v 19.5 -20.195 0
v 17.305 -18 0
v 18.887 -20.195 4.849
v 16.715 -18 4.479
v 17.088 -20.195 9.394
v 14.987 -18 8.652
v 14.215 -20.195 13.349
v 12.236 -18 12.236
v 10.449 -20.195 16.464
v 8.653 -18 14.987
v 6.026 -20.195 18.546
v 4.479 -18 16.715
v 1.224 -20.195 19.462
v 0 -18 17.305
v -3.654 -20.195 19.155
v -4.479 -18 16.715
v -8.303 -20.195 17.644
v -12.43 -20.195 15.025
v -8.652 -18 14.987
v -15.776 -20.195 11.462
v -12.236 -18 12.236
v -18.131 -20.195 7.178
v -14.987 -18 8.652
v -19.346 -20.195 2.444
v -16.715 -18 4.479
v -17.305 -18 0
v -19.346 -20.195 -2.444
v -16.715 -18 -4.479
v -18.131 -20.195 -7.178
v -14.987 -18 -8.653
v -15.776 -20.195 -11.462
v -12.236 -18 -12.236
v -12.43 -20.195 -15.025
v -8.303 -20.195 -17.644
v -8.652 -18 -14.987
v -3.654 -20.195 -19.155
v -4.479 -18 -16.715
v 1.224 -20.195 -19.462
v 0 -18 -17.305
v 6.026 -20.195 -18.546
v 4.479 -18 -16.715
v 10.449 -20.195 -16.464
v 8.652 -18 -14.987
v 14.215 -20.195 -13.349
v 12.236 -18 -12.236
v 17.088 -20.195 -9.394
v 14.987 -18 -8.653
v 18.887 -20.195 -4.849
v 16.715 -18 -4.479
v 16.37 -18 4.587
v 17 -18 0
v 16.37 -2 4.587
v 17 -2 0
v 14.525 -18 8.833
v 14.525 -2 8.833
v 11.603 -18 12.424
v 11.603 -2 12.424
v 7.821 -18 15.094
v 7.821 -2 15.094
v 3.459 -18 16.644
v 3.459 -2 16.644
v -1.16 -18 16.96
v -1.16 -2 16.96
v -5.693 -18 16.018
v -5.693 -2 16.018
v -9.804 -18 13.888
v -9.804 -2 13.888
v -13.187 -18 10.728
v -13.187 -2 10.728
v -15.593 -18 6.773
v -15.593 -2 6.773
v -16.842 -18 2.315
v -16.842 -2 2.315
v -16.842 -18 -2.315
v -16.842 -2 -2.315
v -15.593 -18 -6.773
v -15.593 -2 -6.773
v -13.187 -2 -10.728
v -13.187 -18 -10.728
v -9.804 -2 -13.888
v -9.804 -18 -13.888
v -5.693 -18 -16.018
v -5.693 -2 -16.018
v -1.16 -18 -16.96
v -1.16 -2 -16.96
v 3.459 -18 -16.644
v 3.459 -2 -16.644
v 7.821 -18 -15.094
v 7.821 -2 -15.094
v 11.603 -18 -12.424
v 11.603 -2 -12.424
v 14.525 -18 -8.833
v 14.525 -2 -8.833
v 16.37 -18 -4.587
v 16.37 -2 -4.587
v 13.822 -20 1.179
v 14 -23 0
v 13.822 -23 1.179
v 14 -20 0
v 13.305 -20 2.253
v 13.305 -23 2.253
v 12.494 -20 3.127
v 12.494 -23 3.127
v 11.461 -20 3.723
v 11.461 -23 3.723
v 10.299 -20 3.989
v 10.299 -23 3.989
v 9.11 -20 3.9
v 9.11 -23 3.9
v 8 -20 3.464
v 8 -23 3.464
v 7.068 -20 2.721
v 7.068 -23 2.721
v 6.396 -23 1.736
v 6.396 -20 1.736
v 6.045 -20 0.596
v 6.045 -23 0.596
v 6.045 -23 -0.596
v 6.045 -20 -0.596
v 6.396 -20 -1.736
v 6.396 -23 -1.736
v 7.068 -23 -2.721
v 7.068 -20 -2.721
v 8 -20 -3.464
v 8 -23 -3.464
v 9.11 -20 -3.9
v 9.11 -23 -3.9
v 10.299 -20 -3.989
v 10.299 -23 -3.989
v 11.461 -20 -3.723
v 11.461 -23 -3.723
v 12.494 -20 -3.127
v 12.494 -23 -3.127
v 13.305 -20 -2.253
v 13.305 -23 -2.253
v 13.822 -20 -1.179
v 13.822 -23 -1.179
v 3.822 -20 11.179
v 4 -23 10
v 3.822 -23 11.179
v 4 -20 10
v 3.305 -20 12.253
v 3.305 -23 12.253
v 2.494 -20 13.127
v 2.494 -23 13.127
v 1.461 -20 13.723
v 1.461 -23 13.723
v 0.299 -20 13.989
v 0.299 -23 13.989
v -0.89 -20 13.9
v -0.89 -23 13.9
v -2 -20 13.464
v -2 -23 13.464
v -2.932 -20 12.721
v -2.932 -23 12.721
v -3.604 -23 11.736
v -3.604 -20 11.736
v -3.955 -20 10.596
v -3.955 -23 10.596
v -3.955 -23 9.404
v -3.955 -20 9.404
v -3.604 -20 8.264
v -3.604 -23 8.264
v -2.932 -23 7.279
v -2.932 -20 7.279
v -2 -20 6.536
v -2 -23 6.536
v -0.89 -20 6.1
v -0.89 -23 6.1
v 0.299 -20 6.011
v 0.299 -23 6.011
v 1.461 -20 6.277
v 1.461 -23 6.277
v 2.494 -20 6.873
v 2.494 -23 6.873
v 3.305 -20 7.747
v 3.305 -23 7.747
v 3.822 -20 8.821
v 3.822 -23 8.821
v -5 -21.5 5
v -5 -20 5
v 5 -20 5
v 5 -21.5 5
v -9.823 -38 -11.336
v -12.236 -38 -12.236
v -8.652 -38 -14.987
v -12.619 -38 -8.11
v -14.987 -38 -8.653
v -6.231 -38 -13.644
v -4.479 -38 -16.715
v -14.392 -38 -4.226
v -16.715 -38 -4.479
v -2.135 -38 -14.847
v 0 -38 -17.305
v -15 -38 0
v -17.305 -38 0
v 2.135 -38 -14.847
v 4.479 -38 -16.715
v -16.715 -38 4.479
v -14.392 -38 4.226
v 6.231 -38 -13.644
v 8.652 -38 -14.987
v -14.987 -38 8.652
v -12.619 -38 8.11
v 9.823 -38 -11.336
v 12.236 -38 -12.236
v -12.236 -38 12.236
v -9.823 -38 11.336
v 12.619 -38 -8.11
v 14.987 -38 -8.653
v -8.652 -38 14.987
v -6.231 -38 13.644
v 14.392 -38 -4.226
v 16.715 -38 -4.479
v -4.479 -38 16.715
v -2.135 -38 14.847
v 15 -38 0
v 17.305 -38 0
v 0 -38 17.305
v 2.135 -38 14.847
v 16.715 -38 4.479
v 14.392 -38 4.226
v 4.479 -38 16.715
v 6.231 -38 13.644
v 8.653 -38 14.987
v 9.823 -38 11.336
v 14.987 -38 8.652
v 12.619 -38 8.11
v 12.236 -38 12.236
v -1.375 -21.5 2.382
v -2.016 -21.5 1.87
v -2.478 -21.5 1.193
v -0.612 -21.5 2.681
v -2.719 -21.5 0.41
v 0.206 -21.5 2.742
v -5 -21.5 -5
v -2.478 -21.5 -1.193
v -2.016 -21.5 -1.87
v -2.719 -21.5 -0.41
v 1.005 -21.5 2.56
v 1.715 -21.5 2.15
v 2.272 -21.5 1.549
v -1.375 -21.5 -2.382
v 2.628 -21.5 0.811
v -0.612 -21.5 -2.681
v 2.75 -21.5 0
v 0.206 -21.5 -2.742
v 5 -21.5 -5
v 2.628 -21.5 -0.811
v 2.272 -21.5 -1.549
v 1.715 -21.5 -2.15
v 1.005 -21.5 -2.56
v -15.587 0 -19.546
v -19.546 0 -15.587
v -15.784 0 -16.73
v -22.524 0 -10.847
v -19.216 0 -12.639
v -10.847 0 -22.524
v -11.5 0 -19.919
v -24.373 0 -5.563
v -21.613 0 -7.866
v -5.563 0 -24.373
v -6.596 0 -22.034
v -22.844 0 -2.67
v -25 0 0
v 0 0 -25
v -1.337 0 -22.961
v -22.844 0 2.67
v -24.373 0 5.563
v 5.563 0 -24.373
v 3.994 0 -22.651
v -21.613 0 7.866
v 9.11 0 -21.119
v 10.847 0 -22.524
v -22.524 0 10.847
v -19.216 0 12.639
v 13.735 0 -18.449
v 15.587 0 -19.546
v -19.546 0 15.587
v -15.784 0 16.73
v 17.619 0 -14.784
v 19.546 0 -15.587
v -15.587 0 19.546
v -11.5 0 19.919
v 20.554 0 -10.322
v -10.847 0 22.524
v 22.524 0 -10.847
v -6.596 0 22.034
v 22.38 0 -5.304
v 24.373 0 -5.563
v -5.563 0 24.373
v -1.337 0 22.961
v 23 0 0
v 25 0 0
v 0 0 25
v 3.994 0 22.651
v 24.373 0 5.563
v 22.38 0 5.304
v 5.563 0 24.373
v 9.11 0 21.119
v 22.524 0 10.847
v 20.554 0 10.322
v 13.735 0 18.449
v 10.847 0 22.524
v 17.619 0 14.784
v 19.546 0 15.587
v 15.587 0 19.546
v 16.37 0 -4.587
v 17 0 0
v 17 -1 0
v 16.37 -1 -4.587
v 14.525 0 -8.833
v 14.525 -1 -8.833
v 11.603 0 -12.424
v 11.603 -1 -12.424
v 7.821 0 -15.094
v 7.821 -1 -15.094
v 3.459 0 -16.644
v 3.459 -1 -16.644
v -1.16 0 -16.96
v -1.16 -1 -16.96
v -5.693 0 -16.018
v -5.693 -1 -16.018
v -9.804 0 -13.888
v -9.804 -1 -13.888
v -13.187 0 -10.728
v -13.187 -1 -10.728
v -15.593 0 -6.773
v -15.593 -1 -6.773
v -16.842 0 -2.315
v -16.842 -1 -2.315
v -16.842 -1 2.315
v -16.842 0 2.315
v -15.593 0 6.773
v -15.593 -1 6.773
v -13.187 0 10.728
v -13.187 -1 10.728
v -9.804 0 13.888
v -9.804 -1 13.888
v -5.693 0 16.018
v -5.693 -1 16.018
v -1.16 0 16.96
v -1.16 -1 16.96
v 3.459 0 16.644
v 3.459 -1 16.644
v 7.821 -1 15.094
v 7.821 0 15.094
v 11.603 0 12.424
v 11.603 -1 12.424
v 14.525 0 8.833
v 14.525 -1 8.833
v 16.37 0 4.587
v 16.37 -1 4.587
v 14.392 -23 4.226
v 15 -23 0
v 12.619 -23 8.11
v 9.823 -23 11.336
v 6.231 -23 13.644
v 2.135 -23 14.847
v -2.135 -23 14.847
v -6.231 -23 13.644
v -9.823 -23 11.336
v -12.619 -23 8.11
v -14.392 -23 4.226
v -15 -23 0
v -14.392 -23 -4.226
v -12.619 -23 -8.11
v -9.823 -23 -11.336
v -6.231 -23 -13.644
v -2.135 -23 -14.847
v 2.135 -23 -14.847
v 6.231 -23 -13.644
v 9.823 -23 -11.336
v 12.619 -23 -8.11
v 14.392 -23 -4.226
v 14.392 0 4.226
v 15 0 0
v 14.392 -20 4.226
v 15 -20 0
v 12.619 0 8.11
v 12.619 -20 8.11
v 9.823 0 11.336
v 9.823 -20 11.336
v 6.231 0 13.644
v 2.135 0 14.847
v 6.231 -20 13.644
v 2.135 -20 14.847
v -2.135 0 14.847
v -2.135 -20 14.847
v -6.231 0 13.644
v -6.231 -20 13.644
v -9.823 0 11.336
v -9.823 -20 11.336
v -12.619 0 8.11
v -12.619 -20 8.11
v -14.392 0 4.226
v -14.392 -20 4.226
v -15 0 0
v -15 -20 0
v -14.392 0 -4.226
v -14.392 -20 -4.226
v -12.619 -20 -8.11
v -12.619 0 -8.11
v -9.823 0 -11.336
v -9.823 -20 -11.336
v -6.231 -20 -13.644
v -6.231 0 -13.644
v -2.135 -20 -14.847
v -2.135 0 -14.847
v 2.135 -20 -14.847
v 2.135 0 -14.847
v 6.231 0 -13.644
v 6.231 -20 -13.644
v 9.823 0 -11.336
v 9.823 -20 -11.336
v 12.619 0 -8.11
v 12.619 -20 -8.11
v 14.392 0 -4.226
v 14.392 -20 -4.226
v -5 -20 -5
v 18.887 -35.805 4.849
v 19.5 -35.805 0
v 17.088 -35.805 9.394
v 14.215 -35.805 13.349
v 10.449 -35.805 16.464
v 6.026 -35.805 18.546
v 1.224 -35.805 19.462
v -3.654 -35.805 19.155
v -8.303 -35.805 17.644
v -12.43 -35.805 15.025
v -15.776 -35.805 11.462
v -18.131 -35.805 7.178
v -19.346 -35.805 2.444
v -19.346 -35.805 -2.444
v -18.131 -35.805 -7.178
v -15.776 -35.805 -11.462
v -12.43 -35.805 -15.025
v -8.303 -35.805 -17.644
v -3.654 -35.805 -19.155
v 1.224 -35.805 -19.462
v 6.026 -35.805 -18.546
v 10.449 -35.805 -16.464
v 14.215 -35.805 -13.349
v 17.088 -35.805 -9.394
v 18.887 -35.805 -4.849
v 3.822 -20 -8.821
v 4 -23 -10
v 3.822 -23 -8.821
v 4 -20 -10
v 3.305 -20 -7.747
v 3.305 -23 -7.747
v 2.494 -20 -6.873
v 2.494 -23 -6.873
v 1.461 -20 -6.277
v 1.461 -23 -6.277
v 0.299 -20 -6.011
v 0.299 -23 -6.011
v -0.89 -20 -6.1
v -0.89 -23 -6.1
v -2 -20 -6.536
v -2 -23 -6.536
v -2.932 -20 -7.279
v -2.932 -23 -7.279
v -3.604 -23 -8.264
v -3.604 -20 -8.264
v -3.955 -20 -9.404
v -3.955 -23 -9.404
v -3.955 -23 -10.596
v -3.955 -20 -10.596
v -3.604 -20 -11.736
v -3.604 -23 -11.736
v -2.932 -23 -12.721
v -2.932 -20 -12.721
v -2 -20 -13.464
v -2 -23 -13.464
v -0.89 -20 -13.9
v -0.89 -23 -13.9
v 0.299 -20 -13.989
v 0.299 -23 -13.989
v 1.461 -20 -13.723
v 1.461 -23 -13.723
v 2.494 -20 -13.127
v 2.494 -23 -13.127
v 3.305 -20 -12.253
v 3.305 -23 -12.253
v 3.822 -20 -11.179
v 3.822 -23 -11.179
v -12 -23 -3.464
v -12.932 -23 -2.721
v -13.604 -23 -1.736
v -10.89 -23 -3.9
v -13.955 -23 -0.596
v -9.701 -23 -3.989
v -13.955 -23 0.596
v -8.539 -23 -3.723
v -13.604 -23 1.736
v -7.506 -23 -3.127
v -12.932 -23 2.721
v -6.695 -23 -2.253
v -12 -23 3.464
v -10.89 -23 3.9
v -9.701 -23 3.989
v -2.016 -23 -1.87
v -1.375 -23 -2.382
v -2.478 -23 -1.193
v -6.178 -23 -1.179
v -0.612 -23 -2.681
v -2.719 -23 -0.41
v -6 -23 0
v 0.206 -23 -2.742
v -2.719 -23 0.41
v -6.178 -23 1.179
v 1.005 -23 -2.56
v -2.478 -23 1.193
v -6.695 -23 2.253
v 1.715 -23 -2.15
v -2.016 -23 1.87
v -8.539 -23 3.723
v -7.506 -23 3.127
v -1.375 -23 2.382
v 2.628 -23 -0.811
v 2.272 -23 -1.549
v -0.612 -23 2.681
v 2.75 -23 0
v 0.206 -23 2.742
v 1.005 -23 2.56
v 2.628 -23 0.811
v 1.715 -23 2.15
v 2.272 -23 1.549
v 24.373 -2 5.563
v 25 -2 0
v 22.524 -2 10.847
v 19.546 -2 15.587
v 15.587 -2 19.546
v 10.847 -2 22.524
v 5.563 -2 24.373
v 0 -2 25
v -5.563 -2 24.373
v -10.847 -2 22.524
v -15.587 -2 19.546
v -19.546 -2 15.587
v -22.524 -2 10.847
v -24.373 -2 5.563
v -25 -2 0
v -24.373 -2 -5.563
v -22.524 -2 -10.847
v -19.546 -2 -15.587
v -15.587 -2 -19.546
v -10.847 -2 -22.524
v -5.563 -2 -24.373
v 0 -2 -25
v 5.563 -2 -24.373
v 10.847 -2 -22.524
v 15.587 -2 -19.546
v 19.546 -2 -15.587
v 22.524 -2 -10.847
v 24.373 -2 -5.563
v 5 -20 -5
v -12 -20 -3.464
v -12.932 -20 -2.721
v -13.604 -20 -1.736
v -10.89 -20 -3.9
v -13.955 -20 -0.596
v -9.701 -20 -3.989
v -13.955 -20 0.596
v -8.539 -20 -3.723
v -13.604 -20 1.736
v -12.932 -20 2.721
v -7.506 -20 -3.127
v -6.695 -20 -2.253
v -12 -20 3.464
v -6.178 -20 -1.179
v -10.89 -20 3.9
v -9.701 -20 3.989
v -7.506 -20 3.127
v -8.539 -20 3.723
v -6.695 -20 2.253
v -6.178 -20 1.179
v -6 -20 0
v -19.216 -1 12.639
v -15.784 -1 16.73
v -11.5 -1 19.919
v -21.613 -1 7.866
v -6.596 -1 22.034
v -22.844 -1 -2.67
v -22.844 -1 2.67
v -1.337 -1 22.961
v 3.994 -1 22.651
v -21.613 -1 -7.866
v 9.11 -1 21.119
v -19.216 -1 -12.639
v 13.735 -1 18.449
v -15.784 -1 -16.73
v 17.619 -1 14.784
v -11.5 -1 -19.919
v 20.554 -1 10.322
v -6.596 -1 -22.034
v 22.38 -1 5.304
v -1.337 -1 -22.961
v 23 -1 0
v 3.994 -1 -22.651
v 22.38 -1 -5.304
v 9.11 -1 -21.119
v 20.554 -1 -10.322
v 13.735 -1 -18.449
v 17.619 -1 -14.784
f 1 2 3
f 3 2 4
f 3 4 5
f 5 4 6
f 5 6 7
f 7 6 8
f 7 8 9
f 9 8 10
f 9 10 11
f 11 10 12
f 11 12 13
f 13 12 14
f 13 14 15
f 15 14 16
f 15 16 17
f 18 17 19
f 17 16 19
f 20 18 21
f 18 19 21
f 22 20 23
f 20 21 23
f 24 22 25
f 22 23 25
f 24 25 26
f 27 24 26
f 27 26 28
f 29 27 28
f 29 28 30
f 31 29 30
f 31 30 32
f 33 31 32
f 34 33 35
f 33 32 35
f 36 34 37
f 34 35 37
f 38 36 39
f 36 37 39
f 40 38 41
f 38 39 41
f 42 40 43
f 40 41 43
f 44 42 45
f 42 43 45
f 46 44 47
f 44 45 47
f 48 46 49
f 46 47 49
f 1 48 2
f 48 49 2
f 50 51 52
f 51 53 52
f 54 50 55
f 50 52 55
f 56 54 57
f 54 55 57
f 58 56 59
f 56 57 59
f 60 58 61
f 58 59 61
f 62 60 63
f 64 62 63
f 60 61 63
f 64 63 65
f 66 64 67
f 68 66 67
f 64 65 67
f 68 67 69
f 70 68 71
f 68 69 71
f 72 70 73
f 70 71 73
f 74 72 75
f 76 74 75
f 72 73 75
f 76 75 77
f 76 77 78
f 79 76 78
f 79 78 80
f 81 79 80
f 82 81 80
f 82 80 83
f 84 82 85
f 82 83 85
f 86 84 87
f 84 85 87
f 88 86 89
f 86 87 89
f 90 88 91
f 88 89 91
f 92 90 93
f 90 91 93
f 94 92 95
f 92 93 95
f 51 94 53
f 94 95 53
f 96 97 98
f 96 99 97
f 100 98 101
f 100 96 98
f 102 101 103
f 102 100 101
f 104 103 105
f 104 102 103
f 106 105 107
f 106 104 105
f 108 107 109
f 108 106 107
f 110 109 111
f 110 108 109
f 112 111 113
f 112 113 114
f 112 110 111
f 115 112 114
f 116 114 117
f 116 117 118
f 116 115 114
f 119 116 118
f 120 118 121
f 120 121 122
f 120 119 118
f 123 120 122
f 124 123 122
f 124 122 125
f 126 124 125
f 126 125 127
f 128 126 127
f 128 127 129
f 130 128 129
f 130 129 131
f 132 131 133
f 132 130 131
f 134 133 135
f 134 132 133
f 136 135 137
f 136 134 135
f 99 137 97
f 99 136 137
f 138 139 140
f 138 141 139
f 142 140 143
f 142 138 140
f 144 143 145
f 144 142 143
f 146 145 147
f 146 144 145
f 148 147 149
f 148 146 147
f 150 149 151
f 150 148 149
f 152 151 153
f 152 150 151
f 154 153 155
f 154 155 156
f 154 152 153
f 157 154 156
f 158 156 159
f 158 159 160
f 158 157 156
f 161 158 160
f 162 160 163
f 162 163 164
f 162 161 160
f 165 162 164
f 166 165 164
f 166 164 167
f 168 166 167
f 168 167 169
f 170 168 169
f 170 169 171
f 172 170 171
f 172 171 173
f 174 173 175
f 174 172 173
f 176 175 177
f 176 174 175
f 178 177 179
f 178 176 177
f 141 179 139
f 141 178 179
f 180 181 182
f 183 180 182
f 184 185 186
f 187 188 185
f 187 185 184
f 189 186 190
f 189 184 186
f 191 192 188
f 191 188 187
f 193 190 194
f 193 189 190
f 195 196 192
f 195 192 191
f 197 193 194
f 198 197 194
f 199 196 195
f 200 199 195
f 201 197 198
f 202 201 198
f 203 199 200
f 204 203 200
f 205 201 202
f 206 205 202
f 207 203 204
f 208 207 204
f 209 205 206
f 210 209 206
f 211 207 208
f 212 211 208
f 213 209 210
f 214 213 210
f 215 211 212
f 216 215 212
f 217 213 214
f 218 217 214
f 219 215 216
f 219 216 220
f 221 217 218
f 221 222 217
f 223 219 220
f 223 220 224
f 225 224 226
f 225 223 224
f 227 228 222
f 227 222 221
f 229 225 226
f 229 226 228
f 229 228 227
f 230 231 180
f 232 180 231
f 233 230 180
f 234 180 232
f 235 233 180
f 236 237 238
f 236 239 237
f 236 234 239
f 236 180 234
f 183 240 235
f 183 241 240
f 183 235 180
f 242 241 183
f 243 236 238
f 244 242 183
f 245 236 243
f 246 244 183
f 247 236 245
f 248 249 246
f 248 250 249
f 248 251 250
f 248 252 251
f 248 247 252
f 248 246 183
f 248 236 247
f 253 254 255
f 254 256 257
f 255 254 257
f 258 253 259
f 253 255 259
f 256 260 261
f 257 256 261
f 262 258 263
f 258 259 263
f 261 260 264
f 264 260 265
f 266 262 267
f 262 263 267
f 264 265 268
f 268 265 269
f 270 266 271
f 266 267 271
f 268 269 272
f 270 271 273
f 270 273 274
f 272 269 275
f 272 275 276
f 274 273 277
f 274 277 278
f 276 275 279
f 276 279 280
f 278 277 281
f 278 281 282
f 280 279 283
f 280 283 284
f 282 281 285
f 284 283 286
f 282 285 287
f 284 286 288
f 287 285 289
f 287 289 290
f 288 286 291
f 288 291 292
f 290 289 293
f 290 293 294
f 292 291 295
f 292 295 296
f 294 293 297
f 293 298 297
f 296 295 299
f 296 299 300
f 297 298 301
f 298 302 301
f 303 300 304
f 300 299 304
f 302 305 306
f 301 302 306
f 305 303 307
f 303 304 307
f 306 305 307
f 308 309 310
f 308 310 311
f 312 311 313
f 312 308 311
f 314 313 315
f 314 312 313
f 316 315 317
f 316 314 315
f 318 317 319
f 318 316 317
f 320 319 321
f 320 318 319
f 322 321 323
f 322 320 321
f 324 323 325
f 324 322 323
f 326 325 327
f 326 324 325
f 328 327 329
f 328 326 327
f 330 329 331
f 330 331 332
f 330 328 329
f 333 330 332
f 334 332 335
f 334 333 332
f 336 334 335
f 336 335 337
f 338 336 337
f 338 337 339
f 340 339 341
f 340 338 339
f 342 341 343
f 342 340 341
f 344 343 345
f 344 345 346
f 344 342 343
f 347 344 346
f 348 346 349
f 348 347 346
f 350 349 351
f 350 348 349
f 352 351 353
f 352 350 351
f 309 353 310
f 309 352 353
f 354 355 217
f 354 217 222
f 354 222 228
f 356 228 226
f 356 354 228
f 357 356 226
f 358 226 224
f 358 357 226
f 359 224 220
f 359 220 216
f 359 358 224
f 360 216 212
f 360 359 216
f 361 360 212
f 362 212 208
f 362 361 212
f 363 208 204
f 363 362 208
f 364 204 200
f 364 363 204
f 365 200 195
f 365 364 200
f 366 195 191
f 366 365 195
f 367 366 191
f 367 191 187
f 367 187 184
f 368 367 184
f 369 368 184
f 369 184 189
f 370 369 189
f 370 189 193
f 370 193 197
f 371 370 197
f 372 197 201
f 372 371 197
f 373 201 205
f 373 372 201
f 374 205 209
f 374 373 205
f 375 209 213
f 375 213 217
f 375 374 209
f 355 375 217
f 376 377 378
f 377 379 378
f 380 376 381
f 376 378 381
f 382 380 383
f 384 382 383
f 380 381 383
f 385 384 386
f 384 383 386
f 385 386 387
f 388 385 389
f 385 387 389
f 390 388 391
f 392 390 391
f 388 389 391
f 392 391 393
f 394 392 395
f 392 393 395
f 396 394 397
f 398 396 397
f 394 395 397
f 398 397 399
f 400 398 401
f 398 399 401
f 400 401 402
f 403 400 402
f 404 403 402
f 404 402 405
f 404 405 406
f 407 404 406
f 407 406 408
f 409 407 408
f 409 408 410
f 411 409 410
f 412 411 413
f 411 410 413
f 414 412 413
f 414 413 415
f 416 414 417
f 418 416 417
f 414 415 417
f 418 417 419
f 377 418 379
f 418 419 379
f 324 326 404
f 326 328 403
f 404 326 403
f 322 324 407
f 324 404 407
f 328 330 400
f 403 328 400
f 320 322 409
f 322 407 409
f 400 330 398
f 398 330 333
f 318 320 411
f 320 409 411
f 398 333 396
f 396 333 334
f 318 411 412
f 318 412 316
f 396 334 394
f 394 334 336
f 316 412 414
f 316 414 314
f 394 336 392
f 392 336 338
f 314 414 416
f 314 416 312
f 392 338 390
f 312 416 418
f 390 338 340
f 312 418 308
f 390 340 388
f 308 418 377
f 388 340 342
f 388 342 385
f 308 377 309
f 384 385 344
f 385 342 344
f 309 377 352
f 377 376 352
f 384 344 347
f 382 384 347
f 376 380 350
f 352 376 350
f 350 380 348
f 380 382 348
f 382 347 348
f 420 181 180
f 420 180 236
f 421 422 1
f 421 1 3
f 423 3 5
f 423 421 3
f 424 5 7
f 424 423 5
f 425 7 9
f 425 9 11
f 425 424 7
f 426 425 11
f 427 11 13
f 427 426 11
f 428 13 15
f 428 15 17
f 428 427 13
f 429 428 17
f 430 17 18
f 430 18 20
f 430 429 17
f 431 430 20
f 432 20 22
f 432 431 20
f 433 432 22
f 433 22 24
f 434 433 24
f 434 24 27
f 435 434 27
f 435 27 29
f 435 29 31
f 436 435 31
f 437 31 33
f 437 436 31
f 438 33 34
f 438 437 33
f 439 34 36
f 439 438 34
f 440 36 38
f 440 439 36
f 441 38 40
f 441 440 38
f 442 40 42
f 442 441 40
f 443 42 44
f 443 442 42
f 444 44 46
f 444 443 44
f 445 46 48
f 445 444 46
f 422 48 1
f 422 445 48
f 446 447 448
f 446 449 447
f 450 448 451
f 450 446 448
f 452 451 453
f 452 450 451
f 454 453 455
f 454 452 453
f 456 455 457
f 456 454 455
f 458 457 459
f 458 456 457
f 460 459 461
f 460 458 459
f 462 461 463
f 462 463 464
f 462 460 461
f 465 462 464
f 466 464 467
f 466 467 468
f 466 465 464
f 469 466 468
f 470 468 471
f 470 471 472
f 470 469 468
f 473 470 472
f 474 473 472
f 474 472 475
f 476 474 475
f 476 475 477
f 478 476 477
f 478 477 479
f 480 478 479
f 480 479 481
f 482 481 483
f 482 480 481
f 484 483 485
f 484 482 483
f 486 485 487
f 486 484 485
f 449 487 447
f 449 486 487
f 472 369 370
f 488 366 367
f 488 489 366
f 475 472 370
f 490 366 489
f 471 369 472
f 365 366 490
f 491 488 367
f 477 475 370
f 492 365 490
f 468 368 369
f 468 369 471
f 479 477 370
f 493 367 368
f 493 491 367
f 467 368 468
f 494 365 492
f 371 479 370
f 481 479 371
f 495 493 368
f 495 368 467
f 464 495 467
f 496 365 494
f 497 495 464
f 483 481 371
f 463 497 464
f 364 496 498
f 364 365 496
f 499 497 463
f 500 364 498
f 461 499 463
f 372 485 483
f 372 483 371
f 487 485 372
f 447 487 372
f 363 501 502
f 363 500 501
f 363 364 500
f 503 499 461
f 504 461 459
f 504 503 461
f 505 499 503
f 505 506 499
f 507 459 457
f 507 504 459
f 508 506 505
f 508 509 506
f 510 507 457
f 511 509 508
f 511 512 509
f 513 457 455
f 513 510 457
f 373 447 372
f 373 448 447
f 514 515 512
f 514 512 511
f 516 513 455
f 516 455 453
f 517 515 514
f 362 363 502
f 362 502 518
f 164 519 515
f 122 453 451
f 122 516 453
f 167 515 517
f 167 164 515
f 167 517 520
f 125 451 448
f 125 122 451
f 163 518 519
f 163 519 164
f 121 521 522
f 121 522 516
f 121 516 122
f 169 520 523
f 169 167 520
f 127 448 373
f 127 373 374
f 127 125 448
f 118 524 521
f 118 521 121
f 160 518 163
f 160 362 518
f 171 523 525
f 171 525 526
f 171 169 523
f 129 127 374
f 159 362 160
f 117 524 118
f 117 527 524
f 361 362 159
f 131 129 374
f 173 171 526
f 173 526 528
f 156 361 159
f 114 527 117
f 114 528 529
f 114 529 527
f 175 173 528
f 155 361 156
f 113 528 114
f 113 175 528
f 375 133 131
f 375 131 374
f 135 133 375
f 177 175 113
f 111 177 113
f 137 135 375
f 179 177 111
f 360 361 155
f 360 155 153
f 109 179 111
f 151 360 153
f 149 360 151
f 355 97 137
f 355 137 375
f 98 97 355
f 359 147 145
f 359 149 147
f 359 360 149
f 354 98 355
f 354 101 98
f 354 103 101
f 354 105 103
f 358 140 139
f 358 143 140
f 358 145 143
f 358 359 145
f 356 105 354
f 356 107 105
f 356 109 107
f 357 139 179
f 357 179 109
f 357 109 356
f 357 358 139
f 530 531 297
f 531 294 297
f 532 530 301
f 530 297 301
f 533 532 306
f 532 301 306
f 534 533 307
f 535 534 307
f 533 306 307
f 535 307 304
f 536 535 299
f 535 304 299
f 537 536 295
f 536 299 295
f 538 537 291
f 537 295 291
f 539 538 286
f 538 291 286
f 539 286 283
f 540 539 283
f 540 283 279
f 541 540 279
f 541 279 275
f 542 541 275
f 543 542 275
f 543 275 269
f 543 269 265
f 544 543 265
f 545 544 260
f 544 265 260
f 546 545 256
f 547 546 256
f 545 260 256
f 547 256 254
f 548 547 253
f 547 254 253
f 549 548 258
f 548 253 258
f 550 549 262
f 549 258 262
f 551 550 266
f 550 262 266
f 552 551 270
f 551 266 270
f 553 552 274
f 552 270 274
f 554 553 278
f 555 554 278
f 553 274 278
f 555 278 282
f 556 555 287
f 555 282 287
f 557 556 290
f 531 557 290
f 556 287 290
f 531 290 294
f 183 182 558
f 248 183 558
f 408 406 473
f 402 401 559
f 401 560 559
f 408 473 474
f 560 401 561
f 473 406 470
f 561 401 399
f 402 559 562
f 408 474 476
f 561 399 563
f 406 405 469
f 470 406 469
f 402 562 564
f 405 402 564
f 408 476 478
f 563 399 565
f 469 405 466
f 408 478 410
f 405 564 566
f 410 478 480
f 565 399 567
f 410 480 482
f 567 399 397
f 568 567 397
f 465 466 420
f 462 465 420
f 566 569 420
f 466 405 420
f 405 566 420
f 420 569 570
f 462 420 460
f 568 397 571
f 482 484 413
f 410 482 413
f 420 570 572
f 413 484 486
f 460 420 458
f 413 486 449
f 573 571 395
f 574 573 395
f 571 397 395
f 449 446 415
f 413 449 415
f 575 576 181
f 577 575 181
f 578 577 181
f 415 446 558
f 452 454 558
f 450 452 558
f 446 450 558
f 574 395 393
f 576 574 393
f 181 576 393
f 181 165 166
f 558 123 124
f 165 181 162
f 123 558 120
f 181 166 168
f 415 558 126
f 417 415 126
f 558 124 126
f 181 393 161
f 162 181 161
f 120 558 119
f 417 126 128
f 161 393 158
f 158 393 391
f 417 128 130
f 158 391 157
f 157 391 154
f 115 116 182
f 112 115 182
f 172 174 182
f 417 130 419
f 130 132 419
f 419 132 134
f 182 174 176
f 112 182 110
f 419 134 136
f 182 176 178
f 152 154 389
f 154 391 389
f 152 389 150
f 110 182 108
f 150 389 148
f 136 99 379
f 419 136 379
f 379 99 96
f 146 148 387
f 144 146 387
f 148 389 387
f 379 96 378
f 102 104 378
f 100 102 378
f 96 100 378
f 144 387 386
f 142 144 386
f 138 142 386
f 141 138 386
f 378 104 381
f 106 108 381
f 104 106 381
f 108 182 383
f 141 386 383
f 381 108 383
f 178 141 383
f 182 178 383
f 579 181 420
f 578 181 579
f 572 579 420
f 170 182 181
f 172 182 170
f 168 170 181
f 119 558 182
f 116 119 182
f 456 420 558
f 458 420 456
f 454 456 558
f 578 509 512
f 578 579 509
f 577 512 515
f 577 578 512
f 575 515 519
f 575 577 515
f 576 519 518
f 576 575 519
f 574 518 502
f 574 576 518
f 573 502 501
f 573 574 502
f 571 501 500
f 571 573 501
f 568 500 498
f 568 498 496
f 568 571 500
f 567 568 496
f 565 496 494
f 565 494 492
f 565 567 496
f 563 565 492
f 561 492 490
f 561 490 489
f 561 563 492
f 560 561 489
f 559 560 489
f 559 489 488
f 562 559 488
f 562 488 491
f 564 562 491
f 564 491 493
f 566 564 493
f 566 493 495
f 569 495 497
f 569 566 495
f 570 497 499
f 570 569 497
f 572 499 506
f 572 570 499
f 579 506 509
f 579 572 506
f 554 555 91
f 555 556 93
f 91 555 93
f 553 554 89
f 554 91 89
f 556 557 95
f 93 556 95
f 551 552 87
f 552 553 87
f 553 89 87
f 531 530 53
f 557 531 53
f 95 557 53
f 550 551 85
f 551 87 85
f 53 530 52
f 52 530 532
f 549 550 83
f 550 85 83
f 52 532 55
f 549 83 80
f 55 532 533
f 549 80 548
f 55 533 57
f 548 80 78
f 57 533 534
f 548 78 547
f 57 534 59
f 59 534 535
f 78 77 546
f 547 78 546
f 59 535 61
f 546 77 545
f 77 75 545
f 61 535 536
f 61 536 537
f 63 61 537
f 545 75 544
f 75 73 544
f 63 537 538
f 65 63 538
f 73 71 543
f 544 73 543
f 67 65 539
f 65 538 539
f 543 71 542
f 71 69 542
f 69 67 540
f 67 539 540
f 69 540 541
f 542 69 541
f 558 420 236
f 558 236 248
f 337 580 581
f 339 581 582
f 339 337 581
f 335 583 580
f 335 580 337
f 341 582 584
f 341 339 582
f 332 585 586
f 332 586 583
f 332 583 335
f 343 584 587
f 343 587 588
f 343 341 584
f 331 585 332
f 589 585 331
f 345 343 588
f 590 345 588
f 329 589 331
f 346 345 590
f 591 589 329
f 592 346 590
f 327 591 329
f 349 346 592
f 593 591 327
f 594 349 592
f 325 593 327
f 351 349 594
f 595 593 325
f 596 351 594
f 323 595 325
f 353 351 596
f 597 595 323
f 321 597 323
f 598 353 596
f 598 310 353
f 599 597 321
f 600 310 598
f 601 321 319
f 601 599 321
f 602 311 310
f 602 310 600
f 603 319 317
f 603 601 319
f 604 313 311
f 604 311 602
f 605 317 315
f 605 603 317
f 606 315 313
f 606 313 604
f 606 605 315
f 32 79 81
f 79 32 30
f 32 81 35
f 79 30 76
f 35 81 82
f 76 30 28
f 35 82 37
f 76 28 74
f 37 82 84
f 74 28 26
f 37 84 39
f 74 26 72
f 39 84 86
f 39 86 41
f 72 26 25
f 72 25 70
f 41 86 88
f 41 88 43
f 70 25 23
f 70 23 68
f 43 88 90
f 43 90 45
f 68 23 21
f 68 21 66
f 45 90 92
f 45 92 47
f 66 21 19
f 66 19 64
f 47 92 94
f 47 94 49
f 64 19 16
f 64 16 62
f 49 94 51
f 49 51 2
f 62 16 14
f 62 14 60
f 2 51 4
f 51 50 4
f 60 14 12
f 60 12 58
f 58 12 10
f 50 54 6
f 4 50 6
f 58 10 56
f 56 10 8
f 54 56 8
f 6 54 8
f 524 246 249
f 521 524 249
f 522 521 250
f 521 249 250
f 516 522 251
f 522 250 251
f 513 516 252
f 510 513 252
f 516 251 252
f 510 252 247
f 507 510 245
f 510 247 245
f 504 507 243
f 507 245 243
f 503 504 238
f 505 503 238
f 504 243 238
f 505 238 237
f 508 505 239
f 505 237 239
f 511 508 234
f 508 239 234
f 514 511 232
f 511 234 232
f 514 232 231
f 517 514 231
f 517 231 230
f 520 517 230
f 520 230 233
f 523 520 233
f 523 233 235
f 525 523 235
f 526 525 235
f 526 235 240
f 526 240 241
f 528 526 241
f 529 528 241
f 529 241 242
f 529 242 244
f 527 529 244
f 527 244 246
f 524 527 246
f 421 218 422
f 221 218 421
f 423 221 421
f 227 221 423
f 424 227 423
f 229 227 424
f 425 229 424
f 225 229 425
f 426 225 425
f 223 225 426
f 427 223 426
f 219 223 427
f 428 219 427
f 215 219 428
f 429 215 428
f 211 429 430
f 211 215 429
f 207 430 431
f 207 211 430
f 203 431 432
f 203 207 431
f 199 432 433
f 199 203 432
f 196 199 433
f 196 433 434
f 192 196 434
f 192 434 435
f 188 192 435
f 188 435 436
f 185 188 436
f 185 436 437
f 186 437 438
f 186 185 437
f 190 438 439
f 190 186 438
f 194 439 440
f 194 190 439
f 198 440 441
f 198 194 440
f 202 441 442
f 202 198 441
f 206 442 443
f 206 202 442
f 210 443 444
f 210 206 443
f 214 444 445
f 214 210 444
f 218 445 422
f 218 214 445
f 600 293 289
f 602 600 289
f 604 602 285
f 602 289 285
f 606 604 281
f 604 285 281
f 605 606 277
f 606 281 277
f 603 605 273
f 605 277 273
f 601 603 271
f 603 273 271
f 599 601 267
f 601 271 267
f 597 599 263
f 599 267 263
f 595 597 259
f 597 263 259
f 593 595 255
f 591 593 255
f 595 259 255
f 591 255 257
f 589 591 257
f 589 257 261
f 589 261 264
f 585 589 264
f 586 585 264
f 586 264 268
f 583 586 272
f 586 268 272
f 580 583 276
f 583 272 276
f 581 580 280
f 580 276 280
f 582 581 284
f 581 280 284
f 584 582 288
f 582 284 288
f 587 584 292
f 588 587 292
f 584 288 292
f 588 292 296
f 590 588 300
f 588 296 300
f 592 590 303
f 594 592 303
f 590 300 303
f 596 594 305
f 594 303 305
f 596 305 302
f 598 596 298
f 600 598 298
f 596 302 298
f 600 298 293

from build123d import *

# Parameters (mm, degrees)
SKETCH_3_R          = 23
SKETCH_3_R_2        = 17
CUT_EXTRUDE_1_DEPTH = 1
SKETCH_4_W          = 10
SKETCH_4_H          = 10
CUT_EXTRUDE_2_DEPTH = 1.5
SKETCH_5_R          = 4
CUT_EXTRUDE_3_DEPTH = 3
SKETCH_9_R          = 17
SKETCH_9_R_2        = 4
EXTRUDE_1_DEPTH     = 1
SKETCH_10_R         = 17
SKETCH_10_R_2       = 15
EXTRUDE_2_DEPTH     = 15
SKETCH_11_R         = 2.75
CUT_EXTRUDE_4_DEPTH = 17.5
SKETCH_12_R         = 19.5
SKETCH_12_R_2       = 17
EXTRUDE_3_DEPTH     = 20
CHAMFER_1_SIZE      = 2.195


with BuildPart() as part:
    # Эскиз2 → Повернуть1 (revolve)
    with BuildSketch(Plane.XY):
        Polygon((15, 0), (15, -20), (0, -20), (0, -22), (17, -22), (17, -2), (25, -2), (25, 0), align=None)
    revolve(axis=Axis((0, 0, 0), (0, -1, 0)))

    # Эскиз3 → Вырез-Вытянуть1 (cut)
    with BuildSketch(Plane(origin=(0, 0, 0), x_dir=(1, 0, 0), z_dir=(0, 1, 0))):
        Circle(SKETCH_3_R)
        Circle(SKETCH_3_R_2, mode=Mode.SUBTRACT)
    extrude(amount=-CUT_EXTRUDE_1_DEPTH, mode=Mode.SUBTRACT)

    # Эскиз4 → Вырез-Вытянуть2 (cut)
    with BuildSketch(Plane(origin=(0, -20, 0), x_dir=(1, 0, 0), z_dir=(0, 1, 0))):
        Rectangle(SKETCH_4_W, SKETCH_4_H)
    extrude(amount=-CUT_EXTRUDE_2_DEPTH, mode=Mode.SUBTRACT)

    # Эскиз5 → Вырез-Вытянуть3 (cut, through all)
    with BuildSketch(Plane(origin=(0, -20, 0), x_dir=(1, 0, 0), z_dir=(0, 1, 0))):
        with Locations((0, 10)):
            Circle(SKETCH_5_R)
        with Locations((10, 0)):
            Circle(SKETCH_5_R)
        with Locations((0, -10)):
            Circle(SKETCH_5_R)
        with Locations((-10, 0)):
            Circle(SKETCH_5_R)
    extrude(amount=-CUT_EXTRUDE_3_DEPTH, mode=Mode.SUBTRACT)

    # Эскиз9 → Бобышка-Вытянуть1 (add)
    with BuildSketch(Plane.XZ.offset(22)):
        Circle(SKETCH_9_R)
        with Locations((0, 10)):
            Circle(SKETCH_9_R_2, mode=Mode.SUBTRACT)
        with Locations((-10, 0)):
            Circle(SKETCH_9_R_2, mode=Mode.SUBTRACT)
        with Locations((0, -10)):
            Circle(SKETCH_9_R_2, mode=Mode.SUBTRACT)
        with Locations((10, 0)):
            Circle(SKETCH_9_R_2, mode=Mode.SUBTRACT)
    extrude(amount=EXTRUDE_1_DEPTH)

    # Эскиз10 → Бобышка-Вытянуть2 (add)
    with BuildSketch(Plane.XZ.offset(23)):
        Circle(SKETCH_10_R)
        Circle(SKETCH_10_R_2, mode=Mode.SUBTRACT)
    extrude(amount=EXTRUDE_2_DEPTH)

    # Эскиз11 → Вырез-Вытянуть4 (cut, through all)
    with BuildSketch(Plane(origin=(0, -21.5, 0), x_dir=(1, 0, 0), z_dir=(0, 1, 0))):
        Circle(SKETCH_11_R)
    extrude(amount=-CUT_EXTRUDE_4_DEPTH, mode=Mode.SUBTRACT)

    # Эскиз12 → Бобышка-Вытянуть3 (add)
    with BuildSketch(Plane.XZ.offset(38)):
        Circle(SKETCH_12_R)
        Circle(SKETCH_12_R_2, mode=Mode.SUBTRACT)
    extrude(amount=-EXTRUDE_3_DEPTH)

    # Фаска1
    chamfer_1_edges = [part.edges().sort_by_distance(p)[0] for p in [
        (-19.5, -18, 0),
        (-19.5, -38, 0),
    ]]
    chamfer(chamfer_1_edges, length=CHAMFER_1_SIZE)


solid = part.part
